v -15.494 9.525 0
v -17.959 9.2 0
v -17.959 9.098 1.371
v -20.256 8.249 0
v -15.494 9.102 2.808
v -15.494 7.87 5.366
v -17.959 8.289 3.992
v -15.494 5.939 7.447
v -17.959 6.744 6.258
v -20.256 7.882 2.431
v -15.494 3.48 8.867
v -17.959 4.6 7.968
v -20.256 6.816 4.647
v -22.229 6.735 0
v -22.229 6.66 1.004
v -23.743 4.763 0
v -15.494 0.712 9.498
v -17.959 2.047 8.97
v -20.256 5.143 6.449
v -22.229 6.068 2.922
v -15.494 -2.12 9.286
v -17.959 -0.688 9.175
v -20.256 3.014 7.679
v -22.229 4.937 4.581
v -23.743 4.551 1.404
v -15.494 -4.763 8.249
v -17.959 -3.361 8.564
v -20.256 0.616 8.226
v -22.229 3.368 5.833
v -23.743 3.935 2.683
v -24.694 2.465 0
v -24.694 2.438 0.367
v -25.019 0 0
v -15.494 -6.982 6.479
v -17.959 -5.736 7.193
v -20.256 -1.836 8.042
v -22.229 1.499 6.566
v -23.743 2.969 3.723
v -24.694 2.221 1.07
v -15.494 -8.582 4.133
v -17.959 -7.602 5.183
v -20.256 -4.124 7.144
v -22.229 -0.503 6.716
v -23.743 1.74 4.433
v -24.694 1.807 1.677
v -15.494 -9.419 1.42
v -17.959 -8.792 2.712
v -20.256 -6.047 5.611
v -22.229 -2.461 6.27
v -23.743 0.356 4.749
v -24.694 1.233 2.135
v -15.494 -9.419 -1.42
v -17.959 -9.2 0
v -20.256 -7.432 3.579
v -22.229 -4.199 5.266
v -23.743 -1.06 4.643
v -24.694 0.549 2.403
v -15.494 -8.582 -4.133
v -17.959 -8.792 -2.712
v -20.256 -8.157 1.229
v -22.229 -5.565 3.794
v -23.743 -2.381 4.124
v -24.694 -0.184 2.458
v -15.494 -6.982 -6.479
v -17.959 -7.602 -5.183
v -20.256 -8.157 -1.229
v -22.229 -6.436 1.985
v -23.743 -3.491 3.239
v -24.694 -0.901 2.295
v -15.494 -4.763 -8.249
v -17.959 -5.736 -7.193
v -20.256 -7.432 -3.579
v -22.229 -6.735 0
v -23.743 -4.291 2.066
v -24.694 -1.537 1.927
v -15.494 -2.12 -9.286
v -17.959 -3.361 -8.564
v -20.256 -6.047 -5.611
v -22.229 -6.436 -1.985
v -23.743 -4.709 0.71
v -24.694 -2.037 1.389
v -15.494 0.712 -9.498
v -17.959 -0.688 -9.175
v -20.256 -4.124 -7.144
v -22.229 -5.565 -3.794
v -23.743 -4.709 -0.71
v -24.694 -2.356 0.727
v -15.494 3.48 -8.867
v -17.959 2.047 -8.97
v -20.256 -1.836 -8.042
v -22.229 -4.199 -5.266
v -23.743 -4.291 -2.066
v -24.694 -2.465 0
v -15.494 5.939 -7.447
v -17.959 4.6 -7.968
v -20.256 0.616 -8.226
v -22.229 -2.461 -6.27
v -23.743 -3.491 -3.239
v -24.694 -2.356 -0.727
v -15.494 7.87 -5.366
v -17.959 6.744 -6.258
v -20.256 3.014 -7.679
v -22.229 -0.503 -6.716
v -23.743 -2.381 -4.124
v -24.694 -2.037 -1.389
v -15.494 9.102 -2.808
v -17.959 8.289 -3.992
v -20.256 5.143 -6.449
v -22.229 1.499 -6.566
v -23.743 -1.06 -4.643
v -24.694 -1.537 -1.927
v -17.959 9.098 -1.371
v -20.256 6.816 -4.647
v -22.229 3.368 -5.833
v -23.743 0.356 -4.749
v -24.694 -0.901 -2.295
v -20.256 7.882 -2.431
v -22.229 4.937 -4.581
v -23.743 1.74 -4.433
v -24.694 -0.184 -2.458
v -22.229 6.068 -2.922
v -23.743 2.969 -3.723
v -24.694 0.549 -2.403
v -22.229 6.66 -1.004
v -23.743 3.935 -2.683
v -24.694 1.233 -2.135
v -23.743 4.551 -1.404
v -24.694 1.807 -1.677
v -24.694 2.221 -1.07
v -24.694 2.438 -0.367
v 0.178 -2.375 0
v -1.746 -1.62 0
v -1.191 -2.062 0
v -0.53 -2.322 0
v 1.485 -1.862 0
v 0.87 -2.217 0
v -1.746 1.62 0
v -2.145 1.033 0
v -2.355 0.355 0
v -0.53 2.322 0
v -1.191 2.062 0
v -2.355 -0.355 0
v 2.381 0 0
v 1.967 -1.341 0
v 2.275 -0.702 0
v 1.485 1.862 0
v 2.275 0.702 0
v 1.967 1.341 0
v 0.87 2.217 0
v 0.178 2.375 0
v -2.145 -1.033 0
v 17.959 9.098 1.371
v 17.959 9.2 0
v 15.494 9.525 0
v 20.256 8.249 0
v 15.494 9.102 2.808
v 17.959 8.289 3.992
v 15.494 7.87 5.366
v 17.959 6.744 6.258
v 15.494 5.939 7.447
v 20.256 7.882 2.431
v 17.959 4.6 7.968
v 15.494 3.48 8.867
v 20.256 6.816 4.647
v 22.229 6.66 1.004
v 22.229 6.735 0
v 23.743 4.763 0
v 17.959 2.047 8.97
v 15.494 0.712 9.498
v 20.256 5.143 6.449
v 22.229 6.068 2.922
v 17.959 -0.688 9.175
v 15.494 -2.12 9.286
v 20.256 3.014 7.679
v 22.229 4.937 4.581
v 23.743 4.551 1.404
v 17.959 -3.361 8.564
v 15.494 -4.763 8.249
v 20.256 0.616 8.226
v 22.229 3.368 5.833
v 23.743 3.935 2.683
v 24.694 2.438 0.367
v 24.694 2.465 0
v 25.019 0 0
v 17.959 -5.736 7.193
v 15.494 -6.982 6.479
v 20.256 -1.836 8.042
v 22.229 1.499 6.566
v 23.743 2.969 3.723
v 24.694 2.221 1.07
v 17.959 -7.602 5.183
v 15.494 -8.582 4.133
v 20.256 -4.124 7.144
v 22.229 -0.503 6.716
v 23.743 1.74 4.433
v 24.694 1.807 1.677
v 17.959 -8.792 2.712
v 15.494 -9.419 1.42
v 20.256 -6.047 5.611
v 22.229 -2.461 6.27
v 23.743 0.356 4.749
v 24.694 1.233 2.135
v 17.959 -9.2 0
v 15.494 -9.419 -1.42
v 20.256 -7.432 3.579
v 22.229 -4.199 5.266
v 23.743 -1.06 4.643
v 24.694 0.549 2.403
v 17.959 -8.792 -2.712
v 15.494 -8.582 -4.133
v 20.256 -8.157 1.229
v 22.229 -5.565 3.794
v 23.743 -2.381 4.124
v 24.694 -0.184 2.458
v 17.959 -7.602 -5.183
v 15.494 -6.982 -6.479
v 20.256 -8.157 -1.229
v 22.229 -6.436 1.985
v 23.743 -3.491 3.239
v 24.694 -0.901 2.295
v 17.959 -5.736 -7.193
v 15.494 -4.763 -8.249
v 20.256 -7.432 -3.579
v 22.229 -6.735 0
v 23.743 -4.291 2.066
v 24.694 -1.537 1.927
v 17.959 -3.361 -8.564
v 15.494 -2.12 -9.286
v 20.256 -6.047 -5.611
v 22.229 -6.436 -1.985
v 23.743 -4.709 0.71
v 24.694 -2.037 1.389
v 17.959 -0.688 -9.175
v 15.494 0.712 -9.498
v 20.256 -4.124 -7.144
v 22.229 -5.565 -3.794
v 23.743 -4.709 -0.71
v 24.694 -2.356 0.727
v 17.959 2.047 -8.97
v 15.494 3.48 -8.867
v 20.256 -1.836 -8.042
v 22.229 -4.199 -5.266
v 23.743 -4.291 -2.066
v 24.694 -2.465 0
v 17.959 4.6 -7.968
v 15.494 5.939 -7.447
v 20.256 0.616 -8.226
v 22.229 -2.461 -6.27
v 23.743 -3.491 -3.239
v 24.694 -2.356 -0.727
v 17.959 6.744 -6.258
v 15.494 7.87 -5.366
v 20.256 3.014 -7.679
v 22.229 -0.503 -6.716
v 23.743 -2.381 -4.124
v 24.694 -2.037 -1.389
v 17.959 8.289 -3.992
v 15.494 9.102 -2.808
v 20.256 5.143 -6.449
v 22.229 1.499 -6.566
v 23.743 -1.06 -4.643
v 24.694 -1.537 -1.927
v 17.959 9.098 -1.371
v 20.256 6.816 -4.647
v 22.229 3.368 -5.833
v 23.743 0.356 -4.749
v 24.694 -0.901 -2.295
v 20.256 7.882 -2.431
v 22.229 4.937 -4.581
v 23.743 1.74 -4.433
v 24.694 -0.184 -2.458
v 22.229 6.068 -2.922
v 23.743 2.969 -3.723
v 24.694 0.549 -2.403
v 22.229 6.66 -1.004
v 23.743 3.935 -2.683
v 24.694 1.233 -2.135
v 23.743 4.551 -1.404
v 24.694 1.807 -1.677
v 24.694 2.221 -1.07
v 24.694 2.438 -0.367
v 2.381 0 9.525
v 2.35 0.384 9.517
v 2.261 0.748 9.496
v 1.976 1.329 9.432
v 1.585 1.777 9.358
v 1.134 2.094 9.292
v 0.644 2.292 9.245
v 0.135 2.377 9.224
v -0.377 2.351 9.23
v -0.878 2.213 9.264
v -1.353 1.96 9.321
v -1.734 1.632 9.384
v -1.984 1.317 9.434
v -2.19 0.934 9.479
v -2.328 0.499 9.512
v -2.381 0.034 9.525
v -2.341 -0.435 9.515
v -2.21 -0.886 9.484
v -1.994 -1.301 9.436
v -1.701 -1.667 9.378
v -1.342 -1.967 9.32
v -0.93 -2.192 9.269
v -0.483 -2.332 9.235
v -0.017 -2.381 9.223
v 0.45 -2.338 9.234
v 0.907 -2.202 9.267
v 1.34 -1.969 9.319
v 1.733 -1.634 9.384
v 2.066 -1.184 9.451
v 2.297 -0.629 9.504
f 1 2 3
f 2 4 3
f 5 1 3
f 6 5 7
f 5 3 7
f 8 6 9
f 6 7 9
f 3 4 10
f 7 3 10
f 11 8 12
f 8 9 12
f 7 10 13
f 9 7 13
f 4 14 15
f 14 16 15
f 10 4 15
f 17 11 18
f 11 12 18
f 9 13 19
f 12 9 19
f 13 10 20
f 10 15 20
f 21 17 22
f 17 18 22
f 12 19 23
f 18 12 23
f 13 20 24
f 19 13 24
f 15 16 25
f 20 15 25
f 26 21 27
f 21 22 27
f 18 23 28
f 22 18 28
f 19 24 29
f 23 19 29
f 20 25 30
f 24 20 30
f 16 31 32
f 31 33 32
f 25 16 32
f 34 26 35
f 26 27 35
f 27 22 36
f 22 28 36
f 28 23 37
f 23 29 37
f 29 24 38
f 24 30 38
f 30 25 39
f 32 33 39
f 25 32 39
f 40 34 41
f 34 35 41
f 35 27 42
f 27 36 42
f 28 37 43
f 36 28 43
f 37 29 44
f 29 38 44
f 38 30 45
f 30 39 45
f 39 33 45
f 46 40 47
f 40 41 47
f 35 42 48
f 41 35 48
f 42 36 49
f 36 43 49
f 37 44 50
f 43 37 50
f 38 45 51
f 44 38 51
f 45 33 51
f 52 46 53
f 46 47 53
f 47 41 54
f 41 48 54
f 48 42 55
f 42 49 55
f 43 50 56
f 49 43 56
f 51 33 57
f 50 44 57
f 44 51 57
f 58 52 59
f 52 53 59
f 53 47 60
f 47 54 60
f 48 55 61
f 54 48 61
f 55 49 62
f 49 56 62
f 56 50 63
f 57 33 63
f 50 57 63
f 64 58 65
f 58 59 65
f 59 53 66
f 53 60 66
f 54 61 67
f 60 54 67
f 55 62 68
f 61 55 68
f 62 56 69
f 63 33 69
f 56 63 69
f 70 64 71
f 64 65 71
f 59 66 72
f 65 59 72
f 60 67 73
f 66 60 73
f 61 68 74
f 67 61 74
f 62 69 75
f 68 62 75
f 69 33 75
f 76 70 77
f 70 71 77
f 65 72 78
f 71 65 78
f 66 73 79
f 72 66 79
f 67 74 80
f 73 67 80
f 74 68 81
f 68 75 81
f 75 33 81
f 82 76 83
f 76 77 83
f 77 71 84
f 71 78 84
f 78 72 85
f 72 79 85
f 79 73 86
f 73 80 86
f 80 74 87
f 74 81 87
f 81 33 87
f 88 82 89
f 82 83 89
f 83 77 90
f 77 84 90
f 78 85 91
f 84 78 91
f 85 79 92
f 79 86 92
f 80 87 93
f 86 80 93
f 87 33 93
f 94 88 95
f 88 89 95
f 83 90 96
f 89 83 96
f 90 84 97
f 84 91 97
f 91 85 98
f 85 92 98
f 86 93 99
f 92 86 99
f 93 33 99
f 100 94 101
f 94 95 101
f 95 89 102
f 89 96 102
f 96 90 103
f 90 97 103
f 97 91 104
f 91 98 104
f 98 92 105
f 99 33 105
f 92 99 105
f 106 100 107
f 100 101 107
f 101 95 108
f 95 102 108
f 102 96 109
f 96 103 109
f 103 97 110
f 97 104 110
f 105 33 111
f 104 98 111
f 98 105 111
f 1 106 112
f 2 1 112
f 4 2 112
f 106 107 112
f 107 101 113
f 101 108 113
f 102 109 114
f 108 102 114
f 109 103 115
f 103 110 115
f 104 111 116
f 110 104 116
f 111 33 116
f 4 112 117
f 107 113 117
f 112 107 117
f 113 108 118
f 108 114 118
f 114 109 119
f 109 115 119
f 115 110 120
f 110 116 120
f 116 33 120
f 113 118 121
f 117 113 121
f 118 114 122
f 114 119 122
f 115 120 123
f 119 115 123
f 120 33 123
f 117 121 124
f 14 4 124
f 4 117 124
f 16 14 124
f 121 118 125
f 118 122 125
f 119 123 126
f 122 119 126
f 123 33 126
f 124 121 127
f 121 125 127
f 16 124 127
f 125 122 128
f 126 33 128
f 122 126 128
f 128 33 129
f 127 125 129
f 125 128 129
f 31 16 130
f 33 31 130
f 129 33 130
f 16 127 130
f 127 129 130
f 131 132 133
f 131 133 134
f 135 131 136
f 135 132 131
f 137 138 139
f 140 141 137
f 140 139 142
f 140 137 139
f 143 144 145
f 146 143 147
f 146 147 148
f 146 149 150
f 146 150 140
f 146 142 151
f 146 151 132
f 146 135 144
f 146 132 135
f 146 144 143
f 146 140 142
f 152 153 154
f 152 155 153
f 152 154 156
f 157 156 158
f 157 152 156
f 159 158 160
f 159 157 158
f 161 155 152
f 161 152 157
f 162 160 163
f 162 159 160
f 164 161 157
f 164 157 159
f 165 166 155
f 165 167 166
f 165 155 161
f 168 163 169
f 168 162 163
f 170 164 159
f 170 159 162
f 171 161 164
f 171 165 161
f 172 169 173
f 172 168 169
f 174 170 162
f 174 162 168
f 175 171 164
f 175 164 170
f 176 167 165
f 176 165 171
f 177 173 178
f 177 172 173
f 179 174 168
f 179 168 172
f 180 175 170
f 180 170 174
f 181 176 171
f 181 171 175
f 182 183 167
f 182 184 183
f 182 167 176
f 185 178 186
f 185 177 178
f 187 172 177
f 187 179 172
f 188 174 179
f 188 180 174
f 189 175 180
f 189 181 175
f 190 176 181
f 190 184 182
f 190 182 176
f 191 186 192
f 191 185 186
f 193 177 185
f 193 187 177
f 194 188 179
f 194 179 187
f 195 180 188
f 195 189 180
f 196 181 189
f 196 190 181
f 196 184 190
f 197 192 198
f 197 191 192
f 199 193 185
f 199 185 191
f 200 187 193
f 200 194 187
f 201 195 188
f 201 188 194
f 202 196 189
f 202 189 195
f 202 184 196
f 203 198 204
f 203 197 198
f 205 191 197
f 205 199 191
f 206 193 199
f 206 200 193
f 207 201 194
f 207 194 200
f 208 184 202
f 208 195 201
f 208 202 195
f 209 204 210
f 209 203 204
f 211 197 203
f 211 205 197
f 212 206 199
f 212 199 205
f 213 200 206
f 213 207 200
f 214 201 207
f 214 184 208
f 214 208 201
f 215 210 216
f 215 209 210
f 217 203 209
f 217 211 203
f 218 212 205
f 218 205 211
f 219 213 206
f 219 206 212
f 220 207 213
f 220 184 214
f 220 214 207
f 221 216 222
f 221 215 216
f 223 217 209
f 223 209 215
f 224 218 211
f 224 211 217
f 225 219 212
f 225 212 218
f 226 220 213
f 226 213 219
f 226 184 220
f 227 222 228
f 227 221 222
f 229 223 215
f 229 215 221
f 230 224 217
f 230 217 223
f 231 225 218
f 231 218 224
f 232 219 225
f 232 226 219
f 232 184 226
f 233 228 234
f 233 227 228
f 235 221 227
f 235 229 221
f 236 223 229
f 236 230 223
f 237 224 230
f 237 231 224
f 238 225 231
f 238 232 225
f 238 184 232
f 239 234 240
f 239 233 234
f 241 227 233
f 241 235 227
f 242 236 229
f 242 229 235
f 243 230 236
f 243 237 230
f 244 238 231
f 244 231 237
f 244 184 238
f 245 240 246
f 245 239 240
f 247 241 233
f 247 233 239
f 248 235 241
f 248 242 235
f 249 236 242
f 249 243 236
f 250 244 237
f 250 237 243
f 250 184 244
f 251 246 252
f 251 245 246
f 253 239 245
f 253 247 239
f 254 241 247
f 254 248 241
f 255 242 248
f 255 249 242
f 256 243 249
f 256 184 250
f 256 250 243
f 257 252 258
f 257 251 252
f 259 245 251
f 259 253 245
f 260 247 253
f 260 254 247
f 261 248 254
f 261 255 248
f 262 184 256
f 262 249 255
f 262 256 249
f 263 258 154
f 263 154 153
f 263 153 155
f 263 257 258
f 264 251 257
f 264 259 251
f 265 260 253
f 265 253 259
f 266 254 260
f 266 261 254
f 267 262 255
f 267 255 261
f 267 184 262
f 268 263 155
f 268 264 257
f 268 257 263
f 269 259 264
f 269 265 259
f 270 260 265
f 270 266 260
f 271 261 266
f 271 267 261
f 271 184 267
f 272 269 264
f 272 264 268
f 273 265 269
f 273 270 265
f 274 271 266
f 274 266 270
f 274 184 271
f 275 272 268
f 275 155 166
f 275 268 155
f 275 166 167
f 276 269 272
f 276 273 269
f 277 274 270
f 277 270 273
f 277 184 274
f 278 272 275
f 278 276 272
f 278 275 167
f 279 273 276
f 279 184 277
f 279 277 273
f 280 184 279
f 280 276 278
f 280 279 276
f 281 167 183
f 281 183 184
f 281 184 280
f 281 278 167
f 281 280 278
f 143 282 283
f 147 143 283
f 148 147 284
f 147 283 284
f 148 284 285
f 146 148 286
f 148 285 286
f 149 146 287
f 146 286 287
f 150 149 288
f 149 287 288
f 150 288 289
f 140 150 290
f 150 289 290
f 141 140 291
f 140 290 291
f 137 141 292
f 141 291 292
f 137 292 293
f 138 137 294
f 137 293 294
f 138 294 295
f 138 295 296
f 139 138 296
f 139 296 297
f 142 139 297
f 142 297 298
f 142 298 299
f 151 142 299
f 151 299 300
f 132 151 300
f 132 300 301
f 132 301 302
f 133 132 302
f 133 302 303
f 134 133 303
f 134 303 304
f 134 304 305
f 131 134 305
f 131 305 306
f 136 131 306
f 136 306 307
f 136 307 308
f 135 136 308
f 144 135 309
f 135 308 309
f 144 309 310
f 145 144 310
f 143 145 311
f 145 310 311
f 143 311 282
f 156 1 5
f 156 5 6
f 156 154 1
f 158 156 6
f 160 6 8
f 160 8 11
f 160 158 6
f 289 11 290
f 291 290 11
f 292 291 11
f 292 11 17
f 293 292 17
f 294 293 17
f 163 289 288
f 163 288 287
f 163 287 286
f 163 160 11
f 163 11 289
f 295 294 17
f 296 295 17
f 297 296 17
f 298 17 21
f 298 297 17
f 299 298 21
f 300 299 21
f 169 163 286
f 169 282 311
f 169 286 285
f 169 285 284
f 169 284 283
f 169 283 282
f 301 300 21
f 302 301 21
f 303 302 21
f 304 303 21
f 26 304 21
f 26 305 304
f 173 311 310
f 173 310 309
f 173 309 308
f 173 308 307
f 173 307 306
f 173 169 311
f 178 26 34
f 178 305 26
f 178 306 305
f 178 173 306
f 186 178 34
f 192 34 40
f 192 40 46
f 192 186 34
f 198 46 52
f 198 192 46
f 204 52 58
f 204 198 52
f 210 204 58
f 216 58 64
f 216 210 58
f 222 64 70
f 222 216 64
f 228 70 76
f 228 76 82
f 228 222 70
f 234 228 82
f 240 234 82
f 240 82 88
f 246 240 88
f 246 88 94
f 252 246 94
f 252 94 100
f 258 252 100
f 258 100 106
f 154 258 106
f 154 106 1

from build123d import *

# Parameters (mm, degrees)
F0_R     = 9.525
F1_DEPTH = 25.019
F2_R     = 9.525
F4_R     = 2.38125
F5_DEPTH = 9.525


with BuildPart() as f1:
    # F0 (on Right) → F1 (new body, symmetric)
    with BuildSketch(Plane.YZ):
        Circle(F0_R)
    extrude(amount=F1_DEPTH, both=True)

    # F2
    f2_edges = [f1.edges().sort_by_distance(p)[0] for p in [
        (-25.019, -9.525, 0),
        (25.019, -9.525, 0),
    ]]
    fillet(f2_edges, radius=F2_R)

    # F4 (on plane+point) → F5 (cut)
    with BuildSketch(Plane.XY.offset(9.525)):
        Circle(F4_R)
    extrude(amount=-F5_DEPTH, mode=Mode.SUBTRACT)


solid = f1.part
